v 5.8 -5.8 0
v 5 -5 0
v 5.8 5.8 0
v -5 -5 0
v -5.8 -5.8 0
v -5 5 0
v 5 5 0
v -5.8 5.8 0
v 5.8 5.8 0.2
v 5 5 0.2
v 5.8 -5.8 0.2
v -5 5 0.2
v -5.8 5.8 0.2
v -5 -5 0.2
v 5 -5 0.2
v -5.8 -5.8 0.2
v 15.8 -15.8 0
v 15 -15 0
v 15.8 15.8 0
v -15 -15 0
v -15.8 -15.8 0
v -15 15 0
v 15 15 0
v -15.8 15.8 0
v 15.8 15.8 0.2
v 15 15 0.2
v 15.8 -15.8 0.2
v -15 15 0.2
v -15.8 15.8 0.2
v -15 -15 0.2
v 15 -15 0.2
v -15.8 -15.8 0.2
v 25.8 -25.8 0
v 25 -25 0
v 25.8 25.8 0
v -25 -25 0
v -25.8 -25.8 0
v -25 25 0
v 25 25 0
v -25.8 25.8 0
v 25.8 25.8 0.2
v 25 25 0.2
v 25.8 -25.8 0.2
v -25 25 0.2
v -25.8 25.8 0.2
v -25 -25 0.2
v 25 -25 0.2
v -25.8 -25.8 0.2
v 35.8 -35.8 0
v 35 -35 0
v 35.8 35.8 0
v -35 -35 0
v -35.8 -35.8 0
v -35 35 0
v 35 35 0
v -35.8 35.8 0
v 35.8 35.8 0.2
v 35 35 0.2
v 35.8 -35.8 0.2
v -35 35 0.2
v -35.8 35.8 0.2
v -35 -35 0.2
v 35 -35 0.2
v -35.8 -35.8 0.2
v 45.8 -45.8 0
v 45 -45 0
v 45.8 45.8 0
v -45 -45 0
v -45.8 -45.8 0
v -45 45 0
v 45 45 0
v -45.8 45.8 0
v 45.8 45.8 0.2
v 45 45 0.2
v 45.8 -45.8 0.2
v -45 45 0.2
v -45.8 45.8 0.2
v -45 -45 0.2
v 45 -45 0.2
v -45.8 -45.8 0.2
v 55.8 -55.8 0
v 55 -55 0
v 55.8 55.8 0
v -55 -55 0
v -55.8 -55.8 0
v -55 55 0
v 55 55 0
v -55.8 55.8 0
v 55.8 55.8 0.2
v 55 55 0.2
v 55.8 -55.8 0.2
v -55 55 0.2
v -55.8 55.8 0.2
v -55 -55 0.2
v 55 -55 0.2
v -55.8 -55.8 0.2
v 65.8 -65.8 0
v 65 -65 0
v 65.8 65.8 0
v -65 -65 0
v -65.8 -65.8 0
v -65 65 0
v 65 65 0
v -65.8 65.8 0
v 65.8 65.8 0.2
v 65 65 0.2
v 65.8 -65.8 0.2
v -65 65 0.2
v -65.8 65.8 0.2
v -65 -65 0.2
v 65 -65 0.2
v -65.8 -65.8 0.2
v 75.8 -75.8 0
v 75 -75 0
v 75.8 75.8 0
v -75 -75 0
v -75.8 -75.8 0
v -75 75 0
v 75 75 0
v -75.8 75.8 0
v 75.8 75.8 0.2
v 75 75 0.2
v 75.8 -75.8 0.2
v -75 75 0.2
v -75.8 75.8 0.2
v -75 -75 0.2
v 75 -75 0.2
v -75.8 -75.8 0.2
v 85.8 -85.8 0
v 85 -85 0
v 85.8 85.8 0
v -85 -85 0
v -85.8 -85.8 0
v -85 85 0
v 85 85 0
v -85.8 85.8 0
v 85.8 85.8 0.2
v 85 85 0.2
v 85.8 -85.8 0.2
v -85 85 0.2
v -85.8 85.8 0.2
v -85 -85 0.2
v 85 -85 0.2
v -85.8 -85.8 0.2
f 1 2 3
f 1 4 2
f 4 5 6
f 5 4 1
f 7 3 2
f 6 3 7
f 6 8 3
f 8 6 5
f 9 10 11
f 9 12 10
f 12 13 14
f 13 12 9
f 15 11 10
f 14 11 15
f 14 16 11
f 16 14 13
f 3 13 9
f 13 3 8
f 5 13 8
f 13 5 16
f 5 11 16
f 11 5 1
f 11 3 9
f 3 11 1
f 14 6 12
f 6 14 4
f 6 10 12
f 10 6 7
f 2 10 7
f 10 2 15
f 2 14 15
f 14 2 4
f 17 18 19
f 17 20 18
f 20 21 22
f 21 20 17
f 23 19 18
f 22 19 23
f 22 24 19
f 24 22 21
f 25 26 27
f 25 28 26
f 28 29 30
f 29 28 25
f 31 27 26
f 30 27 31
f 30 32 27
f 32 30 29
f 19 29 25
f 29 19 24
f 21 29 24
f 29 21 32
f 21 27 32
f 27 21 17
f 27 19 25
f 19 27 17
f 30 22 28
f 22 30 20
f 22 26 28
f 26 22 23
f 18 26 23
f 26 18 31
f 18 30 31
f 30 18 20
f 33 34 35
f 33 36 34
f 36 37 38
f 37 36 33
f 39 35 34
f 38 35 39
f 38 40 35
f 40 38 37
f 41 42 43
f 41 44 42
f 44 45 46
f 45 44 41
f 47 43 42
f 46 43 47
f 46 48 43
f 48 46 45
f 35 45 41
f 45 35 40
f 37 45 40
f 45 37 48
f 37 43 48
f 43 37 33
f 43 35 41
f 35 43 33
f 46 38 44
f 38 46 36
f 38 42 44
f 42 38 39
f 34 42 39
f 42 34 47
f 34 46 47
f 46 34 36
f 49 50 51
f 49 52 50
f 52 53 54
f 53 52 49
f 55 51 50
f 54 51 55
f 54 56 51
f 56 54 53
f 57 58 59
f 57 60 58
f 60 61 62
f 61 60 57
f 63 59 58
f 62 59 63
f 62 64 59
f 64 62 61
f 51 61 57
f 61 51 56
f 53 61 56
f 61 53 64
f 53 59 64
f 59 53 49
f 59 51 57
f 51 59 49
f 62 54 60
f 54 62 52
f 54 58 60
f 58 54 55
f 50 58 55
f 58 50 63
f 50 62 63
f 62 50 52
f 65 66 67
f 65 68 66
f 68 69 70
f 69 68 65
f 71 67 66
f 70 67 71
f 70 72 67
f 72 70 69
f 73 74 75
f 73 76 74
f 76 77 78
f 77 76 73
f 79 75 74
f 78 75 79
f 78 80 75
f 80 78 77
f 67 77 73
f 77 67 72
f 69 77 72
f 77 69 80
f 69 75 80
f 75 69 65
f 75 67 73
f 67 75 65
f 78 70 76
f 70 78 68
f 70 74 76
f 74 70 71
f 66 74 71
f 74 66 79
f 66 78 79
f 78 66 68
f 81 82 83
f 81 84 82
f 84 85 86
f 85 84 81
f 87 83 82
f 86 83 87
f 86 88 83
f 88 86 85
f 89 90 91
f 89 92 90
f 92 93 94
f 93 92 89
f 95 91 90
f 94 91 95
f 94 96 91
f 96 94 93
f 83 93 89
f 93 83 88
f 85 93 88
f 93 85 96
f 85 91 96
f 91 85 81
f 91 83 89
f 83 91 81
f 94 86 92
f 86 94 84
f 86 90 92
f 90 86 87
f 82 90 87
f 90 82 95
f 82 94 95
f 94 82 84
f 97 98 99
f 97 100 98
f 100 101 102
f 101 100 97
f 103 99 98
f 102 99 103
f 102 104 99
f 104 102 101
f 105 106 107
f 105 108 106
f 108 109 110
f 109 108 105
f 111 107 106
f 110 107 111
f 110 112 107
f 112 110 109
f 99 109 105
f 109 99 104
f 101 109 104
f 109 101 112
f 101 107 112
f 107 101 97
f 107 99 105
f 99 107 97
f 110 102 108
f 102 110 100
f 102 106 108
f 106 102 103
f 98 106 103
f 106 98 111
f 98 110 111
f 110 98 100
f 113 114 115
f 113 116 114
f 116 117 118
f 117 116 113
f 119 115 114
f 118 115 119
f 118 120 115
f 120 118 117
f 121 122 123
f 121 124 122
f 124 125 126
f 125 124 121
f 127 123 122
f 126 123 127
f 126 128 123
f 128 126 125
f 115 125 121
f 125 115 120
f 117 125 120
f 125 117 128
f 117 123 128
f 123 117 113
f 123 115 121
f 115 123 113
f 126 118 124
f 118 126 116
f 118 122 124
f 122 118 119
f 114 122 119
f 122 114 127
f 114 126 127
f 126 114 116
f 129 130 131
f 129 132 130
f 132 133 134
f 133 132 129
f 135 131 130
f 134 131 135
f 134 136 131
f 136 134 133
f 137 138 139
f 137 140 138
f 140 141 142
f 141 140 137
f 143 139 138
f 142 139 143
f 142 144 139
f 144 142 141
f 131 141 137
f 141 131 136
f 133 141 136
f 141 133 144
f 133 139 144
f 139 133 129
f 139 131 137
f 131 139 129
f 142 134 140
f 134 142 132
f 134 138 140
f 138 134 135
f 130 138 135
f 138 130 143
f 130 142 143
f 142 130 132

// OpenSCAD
for(x = [10 : 20 : 180]) {
  linear_extrude(0.2)
    difference() {      
      square([x + 1.6, x + 1.6], center = true);
      square([x, x], center = true);

  }
}
  
